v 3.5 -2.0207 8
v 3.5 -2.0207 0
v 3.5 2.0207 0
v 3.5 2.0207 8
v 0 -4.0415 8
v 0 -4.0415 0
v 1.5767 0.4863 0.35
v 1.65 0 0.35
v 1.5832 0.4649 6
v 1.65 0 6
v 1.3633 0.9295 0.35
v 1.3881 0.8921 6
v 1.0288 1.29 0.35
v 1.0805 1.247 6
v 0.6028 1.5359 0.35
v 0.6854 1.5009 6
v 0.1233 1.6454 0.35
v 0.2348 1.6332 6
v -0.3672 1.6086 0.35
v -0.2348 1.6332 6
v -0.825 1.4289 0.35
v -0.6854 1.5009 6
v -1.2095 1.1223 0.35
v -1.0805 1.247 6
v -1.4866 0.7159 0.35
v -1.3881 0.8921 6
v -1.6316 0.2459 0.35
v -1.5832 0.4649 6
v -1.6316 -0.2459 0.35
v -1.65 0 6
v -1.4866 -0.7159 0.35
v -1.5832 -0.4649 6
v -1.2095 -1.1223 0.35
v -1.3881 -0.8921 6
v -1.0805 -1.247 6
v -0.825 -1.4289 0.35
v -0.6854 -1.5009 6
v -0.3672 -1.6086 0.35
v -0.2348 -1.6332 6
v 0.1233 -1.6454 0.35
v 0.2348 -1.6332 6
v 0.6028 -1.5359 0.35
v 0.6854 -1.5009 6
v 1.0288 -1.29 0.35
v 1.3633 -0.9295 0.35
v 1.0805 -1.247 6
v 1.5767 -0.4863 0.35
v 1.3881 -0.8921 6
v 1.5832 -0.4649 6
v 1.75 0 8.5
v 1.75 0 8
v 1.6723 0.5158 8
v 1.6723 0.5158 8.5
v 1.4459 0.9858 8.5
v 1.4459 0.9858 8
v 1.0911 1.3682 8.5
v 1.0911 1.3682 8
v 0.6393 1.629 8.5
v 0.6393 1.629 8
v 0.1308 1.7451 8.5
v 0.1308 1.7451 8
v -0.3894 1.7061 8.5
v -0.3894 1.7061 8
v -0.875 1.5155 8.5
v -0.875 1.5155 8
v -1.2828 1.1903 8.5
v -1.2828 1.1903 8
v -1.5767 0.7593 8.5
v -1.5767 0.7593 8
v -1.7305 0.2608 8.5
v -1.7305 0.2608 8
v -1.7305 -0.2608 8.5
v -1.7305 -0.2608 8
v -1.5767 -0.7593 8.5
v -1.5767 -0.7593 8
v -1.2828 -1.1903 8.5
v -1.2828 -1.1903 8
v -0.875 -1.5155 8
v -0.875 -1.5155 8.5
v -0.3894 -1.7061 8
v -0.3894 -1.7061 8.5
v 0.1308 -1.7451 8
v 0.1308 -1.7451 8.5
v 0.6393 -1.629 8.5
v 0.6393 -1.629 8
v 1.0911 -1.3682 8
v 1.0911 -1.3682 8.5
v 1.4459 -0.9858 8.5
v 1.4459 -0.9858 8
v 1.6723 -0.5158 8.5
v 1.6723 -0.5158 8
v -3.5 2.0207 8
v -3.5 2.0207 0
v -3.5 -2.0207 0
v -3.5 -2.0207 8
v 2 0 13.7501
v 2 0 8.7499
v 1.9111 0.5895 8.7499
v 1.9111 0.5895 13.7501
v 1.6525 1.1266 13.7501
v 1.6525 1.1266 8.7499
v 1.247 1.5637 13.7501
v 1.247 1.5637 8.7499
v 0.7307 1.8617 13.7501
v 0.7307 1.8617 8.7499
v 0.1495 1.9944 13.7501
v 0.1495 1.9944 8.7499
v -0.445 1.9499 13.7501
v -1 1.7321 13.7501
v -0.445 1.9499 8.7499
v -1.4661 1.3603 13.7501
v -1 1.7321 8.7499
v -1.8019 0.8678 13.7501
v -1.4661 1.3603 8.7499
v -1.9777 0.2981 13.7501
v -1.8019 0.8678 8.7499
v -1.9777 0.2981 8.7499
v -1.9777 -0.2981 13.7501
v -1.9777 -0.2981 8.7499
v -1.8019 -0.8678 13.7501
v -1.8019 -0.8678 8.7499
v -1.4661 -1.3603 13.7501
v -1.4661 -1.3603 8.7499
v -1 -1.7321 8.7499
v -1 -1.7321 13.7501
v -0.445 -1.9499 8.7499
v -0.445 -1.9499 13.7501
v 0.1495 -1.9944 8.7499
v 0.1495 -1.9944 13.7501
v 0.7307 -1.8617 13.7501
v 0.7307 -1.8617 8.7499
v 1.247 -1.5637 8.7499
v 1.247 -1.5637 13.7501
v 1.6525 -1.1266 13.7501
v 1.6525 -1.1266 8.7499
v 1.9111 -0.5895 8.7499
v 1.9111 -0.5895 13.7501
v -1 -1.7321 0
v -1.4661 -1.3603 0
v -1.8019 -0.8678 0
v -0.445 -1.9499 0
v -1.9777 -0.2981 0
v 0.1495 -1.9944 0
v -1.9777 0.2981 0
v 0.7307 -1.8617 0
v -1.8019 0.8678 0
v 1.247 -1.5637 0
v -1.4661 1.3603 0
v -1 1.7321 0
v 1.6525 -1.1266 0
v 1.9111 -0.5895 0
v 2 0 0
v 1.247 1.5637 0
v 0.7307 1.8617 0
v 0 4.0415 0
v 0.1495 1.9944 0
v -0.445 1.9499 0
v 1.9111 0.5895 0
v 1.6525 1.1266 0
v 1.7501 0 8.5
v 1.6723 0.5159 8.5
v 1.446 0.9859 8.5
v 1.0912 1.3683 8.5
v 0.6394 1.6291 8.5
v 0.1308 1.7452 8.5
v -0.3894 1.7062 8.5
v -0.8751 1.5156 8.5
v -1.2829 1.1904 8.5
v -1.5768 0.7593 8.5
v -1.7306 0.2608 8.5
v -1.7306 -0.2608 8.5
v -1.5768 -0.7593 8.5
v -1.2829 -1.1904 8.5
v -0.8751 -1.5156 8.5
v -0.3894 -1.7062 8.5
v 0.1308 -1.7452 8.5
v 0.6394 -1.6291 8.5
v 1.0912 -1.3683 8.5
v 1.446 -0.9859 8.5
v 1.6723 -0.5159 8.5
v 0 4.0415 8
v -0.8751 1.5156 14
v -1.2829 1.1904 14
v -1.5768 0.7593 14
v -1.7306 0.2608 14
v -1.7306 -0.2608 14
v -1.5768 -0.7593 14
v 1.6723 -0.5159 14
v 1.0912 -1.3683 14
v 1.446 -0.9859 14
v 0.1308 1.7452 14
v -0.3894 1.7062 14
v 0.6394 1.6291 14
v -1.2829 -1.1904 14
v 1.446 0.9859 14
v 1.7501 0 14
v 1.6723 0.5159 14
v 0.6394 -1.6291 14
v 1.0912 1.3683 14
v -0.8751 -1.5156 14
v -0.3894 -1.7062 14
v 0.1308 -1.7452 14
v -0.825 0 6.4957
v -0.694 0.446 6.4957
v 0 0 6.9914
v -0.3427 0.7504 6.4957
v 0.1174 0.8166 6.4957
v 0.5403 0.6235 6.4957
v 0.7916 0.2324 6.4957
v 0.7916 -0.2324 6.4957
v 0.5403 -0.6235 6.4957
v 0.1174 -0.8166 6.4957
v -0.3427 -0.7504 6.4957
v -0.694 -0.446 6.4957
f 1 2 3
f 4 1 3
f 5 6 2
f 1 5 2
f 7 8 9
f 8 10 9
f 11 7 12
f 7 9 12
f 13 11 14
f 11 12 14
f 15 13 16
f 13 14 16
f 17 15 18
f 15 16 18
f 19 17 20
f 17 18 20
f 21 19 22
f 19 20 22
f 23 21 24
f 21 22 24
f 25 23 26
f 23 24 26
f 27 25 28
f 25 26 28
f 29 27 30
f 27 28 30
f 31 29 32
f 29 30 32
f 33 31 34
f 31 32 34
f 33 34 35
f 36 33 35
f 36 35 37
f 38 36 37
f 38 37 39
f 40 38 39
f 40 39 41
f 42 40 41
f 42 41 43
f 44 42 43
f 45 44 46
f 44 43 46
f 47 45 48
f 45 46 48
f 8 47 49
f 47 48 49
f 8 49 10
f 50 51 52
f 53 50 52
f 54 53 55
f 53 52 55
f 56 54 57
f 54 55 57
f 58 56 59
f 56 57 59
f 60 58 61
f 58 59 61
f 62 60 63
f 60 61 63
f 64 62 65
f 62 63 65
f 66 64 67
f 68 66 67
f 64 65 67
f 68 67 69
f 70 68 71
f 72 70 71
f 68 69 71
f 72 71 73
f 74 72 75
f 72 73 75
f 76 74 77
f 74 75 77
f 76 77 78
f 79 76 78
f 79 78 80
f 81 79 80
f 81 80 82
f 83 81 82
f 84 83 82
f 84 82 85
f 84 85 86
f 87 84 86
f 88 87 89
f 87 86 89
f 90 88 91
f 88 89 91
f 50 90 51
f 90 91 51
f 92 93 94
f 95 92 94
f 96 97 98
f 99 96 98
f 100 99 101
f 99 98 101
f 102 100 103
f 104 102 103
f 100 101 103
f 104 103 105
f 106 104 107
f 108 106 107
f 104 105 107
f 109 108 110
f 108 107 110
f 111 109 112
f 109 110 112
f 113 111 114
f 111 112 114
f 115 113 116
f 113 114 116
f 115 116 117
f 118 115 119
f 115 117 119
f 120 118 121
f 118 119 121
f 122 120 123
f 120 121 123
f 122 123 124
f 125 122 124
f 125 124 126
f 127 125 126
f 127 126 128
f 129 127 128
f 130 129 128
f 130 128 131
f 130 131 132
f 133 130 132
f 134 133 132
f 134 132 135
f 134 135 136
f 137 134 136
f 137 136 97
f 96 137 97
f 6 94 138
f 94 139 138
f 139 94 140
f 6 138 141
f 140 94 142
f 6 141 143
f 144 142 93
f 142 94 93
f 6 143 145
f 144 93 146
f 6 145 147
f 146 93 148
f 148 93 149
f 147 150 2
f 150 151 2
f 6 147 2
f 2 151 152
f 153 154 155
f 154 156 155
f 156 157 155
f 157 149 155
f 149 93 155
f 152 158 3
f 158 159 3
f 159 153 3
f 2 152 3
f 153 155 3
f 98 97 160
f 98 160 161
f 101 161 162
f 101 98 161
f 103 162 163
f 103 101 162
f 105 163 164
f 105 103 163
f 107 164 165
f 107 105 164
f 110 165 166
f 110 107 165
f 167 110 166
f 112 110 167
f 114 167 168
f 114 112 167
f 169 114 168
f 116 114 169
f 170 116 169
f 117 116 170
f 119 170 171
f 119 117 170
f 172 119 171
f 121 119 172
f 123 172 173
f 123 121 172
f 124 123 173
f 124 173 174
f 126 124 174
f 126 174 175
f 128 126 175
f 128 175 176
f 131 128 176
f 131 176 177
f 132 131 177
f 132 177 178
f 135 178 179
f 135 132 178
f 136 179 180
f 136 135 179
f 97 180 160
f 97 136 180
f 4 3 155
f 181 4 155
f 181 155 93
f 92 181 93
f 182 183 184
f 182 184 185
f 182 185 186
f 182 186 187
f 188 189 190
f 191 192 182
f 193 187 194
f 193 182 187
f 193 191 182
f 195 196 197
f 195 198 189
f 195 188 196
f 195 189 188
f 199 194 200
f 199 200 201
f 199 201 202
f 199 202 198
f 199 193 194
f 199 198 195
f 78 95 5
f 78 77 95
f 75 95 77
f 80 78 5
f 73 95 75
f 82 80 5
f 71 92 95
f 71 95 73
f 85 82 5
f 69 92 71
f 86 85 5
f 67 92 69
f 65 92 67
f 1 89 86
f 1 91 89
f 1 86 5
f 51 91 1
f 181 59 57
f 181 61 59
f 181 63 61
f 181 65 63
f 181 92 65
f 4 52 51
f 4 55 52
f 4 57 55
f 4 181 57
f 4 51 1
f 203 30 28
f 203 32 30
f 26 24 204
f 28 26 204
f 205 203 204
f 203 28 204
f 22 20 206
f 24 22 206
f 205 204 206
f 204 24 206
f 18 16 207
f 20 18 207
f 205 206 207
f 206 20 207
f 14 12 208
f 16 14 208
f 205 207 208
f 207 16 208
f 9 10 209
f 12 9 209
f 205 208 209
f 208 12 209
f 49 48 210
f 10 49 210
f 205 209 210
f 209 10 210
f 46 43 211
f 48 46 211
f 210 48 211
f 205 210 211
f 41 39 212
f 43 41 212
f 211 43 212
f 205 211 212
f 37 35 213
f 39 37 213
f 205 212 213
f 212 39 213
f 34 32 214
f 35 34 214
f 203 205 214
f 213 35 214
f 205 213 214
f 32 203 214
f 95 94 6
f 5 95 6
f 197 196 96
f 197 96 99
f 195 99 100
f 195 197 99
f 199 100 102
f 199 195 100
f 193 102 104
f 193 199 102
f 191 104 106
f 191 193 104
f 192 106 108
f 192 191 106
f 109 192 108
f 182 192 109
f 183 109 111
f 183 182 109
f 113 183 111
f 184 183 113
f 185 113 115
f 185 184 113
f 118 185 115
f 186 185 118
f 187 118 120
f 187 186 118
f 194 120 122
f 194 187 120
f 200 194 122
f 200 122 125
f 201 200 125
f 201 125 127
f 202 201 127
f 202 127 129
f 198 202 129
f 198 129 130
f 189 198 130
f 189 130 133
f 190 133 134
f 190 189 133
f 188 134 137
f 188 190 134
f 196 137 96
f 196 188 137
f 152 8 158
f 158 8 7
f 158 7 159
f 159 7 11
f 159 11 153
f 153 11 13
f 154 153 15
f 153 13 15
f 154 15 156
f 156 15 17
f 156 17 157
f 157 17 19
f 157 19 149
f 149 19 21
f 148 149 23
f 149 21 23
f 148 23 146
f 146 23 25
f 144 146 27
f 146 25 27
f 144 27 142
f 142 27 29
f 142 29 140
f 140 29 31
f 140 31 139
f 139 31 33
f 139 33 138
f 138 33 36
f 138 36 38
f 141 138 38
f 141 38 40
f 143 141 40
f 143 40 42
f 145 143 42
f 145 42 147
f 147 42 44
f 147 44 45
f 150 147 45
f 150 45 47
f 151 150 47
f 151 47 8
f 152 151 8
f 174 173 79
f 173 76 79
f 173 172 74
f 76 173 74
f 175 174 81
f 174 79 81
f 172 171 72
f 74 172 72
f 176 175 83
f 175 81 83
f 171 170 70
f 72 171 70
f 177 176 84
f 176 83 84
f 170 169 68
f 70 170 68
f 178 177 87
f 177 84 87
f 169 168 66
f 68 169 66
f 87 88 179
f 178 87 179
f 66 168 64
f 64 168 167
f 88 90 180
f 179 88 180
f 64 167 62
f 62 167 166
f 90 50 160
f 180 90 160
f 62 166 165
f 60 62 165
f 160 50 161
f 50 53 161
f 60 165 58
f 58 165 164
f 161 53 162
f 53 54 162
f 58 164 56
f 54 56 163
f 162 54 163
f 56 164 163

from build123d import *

# Parameters (mm, degrees)
EXTRUDE_1_DEPTH             = 8
SKETCH_2_R                  = 2
EXTRUDE_2_DEPTH             = 6
SKETCH_3_R                  = 2
SKETCH_3_R_2                = 1.75
CUT_EXTRUDE_3_DEPTH         = 0.5
CHAMFER_1_SIZE              = 0.25
HOLE_WIZARD_M41_D           = 3.3
HOLE_WIZARD_M41_DEPTH       = 6
HOLE_WIZARD_M41_CSINK_D     = 4
HOLE_WIZARD_M41_CSINK_ANGLE = 90
HOLE_WIZARD_M41_TIP         = 0.991420021


with BuildPart() as part:
    # Эскиз1 → Вытянуть1 (new body)
    with BuildSketch(Plane.XY):
        Polygon((0, 4.041451884), (-3.5, 2.020725942), (-3.5, -2.020725942), (0, -4.041451884), (3.5, -2.020725942), (3.5, 2.020725942), align=None)
    extrude(amount=EXTRUDE_1_DEPTH)

    # Эскиз2 → Вытянуть2 (add)
    with BuildSketch(Plane.XY.offset(8)):
        Circle(SKETCH_2_R)
    extrude(amount=EXTRUDE_2_DEPTH)

    # Эскиз3 → Вырез-Вытянуть3 (cut)
    with BuildSketch(Plane.XY.offset(8)):
        Circle(SKETCH_3_R)
        Circle(SKETCH_3_R_2, mode=Mode.SUBTRACT)
    extrude(amount=CUT_EXTRUDE_3_DEPTH, mode=Mode.SUBTRACT)

    # Фаска1
    chamfer_1_edges = [part.edges().sort_by_distance(p)[0] for p in [
        (-2, 0, 14),
        (-2, 0, 8.5),
    ]]
    chamfer(chamfer_1_edges, length=CHAMFER_1_SIZE - 0.0001)  # a hair under: the kernel refuses the full size

    # Отверстие с зазором M41
    with Locations(Plane(origin=(0, 0, 0), x_dir=(-1, 0, 0), z_dir=(0, 0, -1))):
        with Locations((0, 0)):
            CounterSinkHole(HOLE_WIZARD_M41_D / 2, HOLE_WIZARD_M41_CSINK_D / 2, depth=HOLE_WIZARD_M41_DEPTH, counter_sink_angle=HOLE_WIZARD_M41_CSINK_ANGLE)
            with Locations((0, 0, -(HOLE_WIZARD_M41_DEPTH + HOLE_WIZARD_M41_TIP / 2))):  # 118° drill point
                Cone(0, HOLE_WIZARD_M41_D / 2, HOLE_WIZARD_M41_TIP, mode=Mode.SUBTRACT)


solid = part.part
